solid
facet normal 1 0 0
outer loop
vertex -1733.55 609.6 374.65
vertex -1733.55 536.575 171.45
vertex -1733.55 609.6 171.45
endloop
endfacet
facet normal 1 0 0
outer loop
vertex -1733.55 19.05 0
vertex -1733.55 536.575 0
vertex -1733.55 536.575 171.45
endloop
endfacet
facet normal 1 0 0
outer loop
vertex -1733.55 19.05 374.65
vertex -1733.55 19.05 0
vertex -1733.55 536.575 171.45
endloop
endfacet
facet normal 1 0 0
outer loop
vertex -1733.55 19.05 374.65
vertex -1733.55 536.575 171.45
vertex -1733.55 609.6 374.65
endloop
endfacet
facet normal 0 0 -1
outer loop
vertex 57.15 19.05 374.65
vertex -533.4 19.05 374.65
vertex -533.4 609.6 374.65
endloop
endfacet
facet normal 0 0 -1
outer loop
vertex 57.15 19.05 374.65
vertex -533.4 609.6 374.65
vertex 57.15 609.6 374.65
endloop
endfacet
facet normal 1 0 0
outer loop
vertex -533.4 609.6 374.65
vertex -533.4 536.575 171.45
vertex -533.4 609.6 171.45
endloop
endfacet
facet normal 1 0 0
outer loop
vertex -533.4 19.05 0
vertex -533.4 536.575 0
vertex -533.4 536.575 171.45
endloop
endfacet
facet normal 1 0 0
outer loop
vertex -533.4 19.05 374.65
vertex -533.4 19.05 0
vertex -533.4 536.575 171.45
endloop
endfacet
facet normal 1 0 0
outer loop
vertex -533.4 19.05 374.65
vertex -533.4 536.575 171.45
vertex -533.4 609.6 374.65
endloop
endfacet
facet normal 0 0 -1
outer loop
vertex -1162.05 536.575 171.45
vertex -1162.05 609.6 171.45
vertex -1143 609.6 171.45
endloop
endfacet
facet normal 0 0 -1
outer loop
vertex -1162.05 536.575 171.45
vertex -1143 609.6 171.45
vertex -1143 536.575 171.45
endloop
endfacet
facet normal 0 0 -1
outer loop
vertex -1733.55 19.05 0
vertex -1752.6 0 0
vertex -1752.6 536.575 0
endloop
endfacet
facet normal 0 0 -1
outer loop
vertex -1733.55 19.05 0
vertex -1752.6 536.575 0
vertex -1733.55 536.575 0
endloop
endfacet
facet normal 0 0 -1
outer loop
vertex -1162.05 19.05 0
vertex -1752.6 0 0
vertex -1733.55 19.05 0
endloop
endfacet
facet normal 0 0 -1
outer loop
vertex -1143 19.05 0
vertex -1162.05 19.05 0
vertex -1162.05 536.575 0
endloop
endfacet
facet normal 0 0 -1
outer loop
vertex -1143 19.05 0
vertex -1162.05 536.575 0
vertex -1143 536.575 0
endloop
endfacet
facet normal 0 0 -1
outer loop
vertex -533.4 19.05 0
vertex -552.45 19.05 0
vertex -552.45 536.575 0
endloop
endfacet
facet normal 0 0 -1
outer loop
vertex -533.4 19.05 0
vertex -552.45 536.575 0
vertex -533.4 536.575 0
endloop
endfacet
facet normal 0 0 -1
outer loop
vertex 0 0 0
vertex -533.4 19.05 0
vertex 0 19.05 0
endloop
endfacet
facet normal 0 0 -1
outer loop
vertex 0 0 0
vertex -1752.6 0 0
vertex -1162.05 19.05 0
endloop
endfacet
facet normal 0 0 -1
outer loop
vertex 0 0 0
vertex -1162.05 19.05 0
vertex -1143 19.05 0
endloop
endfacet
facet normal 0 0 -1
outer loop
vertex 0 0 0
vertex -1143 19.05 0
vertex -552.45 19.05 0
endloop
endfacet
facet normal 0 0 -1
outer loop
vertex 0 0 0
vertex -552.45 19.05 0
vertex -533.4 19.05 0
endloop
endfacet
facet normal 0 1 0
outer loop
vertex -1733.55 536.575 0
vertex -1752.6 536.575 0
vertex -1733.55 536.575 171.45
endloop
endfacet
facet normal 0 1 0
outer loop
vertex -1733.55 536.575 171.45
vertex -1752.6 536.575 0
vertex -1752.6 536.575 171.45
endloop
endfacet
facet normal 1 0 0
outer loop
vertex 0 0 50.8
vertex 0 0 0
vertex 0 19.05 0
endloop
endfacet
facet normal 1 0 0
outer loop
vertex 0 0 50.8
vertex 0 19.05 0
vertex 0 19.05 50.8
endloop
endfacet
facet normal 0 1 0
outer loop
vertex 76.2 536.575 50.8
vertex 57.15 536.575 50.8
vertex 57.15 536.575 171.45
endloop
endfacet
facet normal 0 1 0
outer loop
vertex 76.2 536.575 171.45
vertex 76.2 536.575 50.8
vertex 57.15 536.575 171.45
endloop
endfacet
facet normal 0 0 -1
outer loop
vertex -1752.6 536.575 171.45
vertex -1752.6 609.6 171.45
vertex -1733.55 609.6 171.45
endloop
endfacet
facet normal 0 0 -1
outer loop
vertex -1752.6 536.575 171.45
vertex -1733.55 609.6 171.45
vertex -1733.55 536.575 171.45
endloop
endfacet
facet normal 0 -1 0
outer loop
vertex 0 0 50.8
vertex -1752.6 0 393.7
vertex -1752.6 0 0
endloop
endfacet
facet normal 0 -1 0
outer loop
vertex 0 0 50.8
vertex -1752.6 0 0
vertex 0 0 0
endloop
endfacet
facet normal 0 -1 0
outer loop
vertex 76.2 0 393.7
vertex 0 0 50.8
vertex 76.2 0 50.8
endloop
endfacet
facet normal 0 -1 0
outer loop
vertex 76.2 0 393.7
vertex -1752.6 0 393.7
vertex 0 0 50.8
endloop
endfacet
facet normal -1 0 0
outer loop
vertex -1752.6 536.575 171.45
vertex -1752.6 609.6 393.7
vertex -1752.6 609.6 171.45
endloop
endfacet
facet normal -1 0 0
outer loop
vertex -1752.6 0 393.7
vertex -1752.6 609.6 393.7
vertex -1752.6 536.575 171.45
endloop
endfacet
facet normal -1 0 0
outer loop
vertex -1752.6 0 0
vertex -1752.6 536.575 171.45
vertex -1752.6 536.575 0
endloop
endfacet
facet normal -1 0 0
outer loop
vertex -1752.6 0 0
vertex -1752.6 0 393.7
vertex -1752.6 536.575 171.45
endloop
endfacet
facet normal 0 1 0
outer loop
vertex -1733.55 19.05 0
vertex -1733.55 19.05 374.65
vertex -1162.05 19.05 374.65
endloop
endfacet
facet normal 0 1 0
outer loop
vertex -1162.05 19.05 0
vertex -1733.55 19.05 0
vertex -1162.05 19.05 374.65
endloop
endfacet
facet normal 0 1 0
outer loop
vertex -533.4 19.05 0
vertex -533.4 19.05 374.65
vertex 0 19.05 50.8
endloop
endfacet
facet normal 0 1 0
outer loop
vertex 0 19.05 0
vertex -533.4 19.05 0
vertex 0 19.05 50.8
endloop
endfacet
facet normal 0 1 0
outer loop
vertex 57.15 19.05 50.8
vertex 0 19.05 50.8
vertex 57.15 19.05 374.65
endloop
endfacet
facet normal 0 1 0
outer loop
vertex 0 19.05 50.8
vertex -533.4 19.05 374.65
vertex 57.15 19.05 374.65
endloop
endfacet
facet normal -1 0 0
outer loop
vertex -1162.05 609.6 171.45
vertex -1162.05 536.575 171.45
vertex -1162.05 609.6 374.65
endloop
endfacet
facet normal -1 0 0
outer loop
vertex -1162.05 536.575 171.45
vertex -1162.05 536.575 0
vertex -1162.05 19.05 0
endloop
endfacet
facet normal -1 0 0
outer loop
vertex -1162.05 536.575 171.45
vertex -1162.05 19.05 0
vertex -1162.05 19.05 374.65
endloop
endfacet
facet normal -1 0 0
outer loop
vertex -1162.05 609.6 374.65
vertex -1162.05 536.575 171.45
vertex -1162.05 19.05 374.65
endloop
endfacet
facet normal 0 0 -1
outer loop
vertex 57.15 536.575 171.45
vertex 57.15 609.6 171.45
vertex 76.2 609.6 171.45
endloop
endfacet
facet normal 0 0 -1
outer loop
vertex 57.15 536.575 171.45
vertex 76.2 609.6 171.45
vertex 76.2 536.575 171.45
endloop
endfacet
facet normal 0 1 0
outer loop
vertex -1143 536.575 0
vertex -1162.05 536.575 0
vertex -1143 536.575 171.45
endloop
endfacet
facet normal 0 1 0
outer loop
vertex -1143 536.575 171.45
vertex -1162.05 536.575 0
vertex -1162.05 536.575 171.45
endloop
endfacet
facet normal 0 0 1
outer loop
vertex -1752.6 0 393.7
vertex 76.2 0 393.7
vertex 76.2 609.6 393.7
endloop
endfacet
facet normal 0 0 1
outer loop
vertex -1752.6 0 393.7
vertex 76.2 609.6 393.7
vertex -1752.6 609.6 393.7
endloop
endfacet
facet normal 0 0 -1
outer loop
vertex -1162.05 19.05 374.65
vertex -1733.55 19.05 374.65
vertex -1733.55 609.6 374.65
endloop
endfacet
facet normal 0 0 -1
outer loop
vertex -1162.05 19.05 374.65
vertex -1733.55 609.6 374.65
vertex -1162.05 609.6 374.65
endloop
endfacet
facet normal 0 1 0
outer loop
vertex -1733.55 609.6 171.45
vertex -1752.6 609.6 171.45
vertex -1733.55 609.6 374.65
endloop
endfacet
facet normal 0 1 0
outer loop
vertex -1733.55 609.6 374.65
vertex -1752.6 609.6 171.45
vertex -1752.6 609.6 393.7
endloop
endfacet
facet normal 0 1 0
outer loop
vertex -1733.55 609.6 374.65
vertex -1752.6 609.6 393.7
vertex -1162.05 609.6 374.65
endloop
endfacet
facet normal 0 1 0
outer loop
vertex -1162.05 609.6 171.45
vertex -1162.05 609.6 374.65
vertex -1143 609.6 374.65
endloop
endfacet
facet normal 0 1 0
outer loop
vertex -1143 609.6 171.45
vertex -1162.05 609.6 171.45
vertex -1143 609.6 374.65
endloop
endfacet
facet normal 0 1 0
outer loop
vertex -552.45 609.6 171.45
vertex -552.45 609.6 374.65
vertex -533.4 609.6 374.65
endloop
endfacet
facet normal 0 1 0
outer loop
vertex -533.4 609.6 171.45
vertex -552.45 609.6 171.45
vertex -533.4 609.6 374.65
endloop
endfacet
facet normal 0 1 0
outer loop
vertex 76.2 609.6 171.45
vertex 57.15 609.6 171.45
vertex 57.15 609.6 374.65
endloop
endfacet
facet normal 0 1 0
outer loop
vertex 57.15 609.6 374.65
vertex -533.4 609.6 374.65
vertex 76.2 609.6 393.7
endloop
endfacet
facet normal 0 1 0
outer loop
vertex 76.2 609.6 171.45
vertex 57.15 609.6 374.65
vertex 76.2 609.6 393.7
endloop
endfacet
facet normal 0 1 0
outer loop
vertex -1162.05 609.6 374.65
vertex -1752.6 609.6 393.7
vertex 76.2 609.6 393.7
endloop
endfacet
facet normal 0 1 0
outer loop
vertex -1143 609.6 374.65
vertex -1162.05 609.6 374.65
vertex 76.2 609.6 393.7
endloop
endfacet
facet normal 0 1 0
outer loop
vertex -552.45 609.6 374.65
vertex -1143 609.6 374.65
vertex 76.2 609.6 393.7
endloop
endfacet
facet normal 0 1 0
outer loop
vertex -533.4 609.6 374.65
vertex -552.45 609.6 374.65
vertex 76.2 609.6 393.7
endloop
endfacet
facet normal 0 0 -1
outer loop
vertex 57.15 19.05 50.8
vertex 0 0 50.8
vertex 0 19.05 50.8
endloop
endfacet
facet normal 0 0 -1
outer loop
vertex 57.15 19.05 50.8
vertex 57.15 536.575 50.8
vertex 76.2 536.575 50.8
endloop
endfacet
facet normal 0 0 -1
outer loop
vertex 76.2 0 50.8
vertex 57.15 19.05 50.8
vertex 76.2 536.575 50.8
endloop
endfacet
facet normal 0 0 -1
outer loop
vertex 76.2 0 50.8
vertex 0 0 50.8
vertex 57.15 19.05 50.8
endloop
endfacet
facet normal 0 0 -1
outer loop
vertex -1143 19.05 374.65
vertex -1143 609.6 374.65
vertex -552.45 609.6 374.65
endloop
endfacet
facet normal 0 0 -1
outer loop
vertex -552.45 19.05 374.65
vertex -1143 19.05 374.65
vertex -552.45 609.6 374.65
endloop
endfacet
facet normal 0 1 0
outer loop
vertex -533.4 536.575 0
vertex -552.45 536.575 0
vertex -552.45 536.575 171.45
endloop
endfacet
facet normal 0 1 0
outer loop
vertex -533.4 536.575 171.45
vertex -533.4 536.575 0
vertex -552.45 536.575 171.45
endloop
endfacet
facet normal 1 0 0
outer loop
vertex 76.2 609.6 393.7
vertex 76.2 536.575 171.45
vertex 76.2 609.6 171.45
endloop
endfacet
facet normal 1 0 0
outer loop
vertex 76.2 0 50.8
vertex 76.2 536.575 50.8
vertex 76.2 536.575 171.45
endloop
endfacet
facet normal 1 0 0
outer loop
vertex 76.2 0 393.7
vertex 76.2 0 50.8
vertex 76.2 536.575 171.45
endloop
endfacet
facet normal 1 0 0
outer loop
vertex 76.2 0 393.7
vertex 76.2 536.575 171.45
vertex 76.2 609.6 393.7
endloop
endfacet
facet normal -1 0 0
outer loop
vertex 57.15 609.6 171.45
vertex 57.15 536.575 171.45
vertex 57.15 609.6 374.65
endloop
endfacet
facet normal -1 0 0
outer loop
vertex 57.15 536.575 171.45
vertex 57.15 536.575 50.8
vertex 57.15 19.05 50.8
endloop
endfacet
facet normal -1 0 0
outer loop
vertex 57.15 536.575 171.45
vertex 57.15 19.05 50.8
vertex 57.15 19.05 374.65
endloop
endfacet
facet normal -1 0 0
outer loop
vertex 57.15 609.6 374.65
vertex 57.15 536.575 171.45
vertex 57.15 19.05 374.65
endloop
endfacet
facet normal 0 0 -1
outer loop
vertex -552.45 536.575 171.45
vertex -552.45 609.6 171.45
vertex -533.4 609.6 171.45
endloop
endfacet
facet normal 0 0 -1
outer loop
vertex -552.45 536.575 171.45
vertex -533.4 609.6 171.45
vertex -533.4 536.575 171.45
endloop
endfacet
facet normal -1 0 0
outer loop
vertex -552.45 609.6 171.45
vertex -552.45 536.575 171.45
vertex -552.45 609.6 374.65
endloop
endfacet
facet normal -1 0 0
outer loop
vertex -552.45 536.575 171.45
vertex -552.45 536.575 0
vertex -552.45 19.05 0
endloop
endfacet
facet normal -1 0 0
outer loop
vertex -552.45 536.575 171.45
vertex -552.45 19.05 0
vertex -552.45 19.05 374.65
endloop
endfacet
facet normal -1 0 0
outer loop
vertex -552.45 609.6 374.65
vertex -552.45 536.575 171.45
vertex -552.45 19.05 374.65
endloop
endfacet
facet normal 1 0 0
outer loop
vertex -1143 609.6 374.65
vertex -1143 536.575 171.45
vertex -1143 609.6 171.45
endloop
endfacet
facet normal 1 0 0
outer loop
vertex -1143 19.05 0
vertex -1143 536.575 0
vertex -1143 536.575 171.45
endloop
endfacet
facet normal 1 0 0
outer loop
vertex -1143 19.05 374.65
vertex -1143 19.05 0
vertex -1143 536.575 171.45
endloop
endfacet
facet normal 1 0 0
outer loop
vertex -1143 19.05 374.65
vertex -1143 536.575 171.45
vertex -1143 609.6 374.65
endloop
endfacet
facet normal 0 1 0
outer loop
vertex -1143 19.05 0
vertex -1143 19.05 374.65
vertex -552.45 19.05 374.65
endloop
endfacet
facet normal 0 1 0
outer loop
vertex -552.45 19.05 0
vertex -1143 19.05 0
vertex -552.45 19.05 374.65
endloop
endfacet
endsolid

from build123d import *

# Parameters (mm, degrees)
F0_W     = 19.05
F0_H     = 374.65
F0_H_2   = 323.85
F1_DEPTH = 609.6
F0_W_2   = 571.5
F0_W_3   = 590.55
F2_DEPTH = 19.05
F3_W     = 73.025
F3_H     = 171.45
F4_DEPTH = 1828.8


with BuildPart() as f1:
    # F0 (on Front) → F1 (new body)
    with BuildSketch(Plane.XZ):
        with Locations((-1743.075, 187.325)):
            Rectangle(F0_W, F0_H)
        Polygon((-552.45, 374.65), (-533.4, 374.65), (57.15, 374.65), (76.2, 374.65), (76.2, 393.7), (-1752.6, 393.7), (-1752.6, 374.65), (-1733.55, 374.65), (-1162.05, 374.65), (-1143, 374.65), align=None)
        with Locations((-1152.525, 187.325)):
            Rectangle(F0_W, F0_H)
        with Locations((-542.925, 187.325)):
            Rectangle(F0_W, F0_H)
        with Locations((66.675, 212.725)):
            Rectangle(F0_W, F0_H_2)
    extrude(amount=-F1_DEPTH)

    # F0 (on Front) → F2 (join)
    with BuildSketch(Plane.XZ):
        with Locations((-1743.075, 187.325)):
            Rectangle(F0_W, F0_H)
        with Locations((-1447.8, 187.325)):
            Rectangle(F0_W_2, F0_H)
        Polygon((-552.45, 374.65), (-533.4, 374.65), (57.15, 374.65), (76.2, 374.65), (76.2, 393.7), (-1752.6, 393.7), (-1752.6, 374.65), (-1733.55, 374.65), (-1162.05, 374.65), (-1143, 374.65), align=None)
        with Locations((-847.725, 187.325)):
            Rectangle(F0_W_3, F0_H)
        with Locations((-542.925, 187.325)):
            Rectangle(F0_W, F0_H)
        Polygon((-533.4, 0), (0, 0), (0, 50.8), (57.15, 50.8), (57.15, 374.65), (-533.4, 374.65), align=None)
        with Locations((66.675, 212.725)):
            Rectangle(F0_W, F0_H_2)
    extrude(amount=-F2_DEPTH)

    # F3 (on face) → F4 (cut, through all)
    with BuildSketch(Plane(origin=(-1752.6, 0, 0), x_dir=(0, -1, 0), z_dir=(-1, 0, 0))):
        with Locations((-573.0875, 85.725)):
            Rectangle(F3_W, F3_H)
    extrude(amount=-F4_DEPTH, mode=Mode.SUBTRACT)


solid = f1.part
